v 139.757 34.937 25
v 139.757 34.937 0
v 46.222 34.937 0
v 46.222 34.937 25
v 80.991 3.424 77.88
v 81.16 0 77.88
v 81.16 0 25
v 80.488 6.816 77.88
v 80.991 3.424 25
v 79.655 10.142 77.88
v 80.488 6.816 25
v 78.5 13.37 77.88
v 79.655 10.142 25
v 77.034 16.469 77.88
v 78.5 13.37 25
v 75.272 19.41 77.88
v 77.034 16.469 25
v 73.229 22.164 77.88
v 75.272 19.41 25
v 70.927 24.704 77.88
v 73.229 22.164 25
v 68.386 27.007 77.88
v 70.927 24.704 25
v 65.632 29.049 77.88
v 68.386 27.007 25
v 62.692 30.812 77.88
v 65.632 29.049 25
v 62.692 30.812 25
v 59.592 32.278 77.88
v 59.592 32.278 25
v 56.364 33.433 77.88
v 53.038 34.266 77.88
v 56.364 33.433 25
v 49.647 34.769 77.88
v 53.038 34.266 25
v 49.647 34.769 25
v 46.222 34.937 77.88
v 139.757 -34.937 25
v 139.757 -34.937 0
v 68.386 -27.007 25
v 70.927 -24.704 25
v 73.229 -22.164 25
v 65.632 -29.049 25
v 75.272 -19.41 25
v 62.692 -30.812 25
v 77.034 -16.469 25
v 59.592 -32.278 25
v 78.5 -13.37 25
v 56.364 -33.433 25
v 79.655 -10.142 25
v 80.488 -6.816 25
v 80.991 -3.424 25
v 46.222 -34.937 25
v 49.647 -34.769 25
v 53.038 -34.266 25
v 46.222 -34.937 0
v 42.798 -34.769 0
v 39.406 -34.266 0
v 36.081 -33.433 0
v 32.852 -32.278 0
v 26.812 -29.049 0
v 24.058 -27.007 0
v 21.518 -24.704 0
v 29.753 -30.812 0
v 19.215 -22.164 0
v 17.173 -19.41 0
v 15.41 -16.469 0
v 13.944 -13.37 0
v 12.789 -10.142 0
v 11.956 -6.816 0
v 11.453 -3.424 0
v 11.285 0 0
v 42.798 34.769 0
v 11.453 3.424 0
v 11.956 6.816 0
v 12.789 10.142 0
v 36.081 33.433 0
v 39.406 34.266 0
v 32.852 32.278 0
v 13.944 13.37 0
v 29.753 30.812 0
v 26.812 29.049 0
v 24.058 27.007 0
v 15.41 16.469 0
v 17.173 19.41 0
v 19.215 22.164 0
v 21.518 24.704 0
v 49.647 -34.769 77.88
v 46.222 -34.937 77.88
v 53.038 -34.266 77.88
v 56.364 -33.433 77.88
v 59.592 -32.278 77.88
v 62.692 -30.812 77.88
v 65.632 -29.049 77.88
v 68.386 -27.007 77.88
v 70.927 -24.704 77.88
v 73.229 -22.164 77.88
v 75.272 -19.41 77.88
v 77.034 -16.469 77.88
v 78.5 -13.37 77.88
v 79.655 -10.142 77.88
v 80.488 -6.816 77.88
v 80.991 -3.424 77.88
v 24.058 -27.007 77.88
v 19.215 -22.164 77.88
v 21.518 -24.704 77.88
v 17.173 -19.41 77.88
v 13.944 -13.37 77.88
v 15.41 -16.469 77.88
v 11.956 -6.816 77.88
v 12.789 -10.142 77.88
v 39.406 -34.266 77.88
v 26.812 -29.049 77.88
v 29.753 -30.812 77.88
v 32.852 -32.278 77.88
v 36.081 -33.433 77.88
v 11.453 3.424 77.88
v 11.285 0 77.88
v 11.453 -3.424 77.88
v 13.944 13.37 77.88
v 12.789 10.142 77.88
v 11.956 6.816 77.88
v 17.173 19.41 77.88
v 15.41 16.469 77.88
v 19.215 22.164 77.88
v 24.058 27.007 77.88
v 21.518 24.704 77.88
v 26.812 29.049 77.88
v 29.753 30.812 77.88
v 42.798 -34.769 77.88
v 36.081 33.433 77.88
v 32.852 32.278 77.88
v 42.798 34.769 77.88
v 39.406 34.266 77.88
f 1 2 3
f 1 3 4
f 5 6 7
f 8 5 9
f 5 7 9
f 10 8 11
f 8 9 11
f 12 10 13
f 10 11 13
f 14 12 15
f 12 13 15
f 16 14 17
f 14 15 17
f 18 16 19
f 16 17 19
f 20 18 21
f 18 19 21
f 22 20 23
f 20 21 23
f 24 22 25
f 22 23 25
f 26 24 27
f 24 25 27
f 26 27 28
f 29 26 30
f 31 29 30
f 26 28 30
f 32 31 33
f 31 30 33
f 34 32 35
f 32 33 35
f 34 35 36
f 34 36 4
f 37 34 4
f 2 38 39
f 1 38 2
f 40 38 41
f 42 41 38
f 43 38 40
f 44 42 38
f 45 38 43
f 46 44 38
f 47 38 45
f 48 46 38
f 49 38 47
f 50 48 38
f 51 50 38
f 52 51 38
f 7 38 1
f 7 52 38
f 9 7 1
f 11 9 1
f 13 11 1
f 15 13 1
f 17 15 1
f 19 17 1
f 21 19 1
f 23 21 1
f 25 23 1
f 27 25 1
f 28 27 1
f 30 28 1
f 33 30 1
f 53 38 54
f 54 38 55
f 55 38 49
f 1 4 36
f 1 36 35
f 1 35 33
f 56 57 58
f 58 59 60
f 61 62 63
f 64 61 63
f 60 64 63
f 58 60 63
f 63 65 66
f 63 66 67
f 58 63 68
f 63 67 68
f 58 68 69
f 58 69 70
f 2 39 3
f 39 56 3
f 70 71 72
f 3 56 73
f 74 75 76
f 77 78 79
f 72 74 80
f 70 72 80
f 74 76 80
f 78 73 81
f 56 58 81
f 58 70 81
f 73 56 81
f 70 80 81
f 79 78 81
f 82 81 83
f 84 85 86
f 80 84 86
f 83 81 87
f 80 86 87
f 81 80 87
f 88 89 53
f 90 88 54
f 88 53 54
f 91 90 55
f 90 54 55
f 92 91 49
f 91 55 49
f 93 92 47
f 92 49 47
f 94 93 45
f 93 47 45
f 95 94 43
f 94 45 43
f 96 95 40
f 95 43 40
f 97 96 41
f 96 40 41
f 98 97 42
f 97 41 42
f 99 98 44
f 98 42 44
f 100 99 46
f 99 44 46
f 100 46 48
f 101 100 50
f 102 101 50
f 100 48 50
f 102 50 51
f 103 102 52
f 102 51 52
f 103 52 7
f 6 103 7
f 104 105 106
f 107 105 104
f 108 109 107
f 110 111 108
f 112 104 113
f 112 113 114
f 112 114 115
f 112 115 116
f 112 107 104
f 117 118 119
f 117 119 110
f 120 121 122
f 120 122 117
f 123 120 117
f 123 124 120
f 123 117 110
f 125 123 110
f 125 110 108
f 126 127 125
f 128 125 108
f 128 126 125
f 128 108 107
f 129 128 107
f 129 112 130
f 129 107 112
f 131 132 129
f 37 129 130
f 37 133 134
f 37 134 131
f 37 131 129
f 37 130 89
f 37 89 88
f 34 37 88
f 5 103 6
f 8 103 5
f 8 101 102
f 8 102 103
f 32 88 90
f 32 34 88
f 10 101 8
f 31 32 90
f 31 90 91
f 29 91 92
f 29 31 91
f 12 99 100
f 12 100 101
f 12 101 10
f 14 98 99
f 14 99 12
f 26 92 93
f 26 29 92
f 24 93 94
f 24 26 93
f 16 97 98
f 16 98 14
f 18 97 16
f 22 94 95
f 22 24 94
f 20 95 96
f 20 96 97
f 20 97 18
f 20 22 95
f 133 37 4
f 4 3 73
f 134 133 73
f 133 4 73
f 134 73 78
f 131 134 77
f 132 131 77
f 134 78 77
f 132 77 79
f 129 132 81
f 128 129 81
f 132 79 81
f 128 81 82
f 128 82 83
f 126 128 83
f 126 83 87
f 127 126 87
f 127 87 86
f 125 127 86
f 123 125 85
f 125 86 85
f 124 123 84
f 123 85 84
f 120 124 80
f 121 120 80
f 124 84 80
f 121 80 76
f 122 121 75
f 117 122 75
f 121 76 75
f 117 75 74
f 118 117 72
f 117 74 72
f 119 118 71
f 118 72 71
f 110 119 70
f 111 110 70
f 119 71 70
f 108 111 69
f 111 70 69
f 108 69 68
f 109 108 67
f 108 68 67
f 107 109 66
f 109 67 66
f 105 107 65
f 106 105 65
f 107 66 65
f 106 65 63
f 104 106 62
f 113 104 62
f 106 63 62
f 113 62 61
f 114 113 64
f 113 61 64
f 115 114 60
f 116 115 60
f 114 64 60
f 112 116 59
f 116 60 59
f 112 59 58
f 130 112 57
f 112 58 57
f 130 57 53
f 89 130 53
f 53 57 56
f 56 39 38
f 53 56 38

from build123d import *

# Parameters (mm, degrees)
F1_DEPTH  = 25
F2_DEPTH  = 77.880271
F1_FACE_W = 69.874778
F1_FACE_H = 25
F3_DEPTH  = 43.570839


with BuildPart() as f1:
    # F0 (on Top) → F1 (new body)
    with BuildSketch(Plane.XY):
        with BuildLine():
            Line((96.185938, -34.937389), (96.185938, 34.937389))
            Line((96.185938, 34.937389), (46.22232, 34.937389))
            ThreePointArc((46.22232, 34.937389), (70.926784, 24.704465), (81.159709, 0))
            ThreePointArc((81.159709, 0), (70.926784, -24.704465), (46.22232, -34.937389))
            Line((46.22232, -34.937389), (96.185938, -34.937389))
        make_face()
        with BuildLine():
            Line((46.22232, -34.937389), (46.22232, 34.937389))
            ThreePointArc((46.22232, 34.937389), (11.28493, 0), (46.22232, -34.937389))
        make_face()
        with BuildLine():
            ThreePointArc((81.159709, 0), (70.926784, 24.704465), (46.22232, 34.937389))
            Line((46.22232, 34.937389), (46.22232, -34.937389))
            ThreePointArc((46.22232, -34.937389), (70.926784, -24.704465), (81.159709, 0))
        make_face()
    extrude(amount=F1_DEPTH)

    # F0 (on Top) → F2 (join)
    with BuildSketch(Plane.XY):
        with BuildLine():
            ThreePointArc((81.159709, 0), (70.926784, 24.704465), (46.22232, 34.937389))
            Line((46.22232, 34.937389), (46.22232, -34.937389))
            ThreePointArc((46.22232, -34.937389), (70.926784, -24.704465), (81.159709, 0))
        make_face()
        with BuildLine():
            Line((46.22232, -34.937389), (46.22232, 34.937389))
            ThreePointArc((46.22232, 34.937389), (11.28493, 0), (46.22232, -34.937389))
        make_face()
    extrude(amount=F2_DEPTH)

    # F1_face (on face) → F3 (join)
    with BuildSketch(Plane(origin=(96.185938, 0, 12.5), x_dir=(0, 1, 0), z_dir=(1, 0, 0))):
        Rectangle(F1_FACE_W, F1_FACE_H)
    extrude(amount=F3_DEPTH)


solid = f1.part
